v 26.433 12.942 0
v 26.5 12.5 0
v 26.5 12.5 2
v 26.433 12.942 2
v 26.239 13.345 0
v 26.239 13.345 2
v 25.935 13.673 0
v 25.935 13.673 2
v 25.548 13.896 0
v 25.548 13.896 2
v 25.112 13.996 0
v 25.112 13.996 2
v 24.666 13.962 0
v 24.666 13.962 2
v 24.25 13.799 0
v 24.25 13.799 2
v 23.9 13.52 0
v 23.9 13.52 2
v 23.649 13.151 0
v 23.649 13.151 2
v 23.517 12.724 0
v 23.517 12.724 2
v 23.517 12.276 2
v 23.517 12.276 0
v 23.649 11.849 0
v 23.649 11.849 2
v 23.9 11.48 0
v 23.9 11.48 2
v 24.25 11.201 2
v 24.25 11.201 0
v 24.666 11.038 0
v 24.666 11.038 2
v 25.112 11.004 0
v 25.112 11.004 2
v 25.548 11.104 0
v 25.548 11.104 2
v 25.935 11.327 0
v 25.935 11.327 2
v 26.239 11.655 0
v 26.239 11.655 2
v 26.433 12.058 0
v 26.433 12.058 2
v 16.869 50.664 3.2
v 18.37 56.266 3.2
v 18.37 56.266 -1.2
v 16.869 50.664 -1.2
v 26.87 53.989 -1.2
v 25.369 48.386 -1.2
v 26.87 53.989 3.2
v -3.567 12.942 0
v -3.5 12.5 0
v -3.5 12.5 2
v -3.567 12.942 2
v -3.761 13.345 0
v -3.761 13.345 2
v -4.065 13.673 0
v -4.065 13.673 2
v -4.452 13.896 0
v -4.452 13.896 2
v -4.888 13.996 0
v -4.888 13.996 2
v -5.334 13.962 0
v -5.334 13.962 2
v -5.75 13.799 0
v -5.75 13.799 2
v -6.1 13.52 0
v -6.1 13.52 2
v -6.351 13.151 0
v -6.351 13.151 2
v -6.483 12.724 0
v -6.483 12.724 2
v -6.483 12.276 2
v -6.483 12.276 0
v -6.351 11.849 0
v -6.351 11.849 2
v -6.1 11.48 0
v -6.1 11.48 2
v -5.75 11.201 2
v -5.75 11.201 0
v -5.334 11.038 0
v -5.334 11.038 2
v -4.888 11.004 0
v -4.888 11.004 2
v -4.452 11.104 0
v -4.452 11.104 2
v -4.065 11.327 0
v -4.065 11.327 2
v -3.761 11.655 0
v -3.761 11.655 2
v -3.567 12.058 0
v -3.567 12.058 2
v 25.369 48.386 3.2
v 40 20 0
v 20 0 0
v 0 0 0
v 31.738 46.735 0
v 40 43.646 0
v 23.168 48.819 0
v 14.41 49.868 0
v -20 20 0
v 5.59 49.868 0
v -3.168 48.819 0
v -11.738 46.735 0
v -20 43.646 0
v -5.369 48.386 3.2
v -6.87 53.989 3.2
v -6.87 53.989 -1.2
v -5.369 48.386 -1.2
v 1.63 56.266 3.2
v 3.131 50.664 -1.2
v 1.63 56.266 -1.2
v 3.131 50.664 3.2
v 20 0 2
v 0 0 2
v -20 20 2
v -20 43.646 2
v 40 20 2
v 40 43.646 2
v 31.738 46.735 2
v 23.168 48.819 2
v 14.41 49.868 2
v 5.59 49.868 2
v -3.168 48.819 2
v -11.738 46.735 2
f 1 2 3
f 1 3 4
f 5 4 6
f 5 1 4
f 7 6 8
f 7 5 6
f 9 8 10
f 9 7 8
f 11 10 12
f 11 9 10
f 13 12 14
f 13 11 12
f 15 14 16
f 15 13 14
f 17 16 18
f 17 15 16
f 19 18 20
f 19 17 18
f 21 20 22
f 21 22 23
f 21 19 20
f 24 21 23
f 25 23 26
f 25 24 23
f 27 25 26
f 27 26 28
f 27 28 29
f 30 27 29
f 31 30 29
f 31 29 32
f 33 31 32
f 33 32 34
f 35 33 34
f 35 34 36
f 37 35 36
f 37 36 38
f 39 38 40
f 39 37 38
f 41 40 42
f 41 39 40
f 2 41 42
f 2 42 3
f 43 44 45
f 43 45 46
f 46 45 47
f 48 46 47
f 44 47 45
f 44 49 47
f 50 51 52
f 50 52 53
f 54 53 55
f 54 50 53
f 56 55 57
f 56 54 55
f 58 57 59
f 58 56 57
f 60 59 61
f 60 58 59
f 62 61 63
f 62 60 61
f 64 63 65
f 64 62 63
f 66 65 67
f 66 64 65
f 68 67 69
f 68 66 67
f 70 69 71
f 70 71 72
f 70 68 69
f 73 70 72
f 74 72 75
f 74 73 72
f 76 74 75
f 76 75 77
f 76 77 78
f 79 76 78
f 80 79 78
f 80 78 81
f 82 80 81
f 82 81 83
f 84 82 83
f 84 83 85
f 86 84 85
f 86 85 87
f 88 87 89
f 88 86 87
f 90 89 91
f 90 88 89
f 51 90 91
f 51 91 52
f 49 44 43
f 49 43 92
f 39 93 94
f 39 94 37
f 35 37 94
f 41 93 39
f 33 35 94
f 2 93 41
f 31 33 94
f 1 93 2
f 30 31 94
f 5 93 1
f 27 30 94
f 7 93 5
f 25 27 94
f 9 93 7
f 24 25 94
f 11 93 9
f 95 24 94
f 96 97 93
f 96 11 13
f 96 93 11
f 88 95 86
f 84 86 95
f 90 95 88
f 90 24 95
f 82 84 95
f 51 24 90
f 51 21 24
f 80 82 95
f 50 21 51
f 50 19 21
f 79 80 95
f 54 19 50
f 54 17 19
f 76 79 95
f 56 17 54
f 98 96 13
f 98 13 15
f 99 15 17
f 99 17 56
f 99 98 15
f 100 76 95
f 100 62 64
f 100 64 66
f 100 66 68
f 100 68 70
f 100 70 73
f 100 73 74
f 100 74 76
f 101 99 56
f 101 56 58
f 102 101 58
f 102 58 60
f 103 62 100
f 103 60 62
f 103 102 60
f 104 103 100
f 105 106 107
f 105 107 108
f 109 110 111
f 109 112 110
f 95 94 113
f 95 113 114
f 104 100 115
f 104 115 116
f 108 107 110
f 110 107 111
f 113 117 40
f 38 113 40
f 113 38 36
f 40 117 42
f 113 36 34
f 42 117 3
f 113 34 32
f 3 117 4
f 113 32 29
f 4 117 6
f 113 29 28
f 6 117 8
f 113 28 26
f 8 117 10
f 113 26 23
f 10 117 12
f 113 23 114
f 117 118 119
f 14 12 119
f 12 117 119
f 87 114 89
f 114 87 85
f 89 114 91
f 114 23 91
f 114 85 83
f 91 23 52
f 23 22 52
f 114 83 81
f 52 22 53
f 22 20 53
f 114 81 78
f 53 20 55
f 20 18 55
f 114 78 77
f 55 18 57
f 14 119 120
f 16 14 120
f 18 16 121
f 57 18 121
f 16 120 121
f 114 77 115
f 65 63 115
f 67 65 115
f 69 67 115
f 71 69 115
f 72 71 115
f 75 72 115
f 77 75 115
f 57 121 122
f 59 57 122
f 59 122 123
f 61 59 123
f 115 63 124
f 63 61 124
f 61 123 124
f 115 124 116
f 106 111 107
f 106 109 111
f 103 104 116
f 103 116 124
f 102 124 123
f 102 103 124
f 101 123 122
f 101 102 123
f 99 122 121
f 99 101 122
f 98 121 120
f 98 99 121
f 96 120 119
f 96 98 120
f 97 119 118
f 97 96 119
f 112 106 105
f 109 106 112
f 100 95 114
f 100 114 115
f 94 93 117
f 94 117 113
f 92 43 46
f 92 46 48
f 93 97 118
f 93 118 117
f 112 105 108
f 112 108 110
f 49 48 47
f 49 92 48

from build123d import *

# Parameters (mm, degrees)
BOSS_EXTRU_1_DEPTH        = 3.2
BOSS_EXTRU_1_DEPTH_BACK   = 1.2
BOSS_EXTRU_1_2_DEPTH      = 3.2
BOSS_EXTRU_1_2_DEPTH_BACK = 1.2
ESQUISSE3_3_R             = 1.5
BOSS_EXTRU_2_DEPTH        = 2


with BuildPart() as part:
    # Esquisse3 → Boss.-Extru.1 (new, two sides: drawn at the far end of the back side and taken through both)
    with BuildSketch(Plane.XY.offset(-BOSS_EXTRU_1_DEPTH_BACK)):
        Polygon((-6.870147271, 53.988790736), (-5.36899681, 48.386420944), (3.131150462, 50.664028541), (1.63, 56.266398333), align=None)
    extrude(amount=BOSS_EXTRU_1_DEPTH + BOSS_EXTRU_1_DEPTH_BACK)


with BuildPart() as body_2:
    # Esquisse3 → Boss.-Extru.1 2 (new, two sides: drawn at the far end of the back side and taken through both)
    with BuildSketch(Plane.XY.offset(-BOSS_EXTRU_1_2_DEPTH_BACK)):
        Polygon((16.868849538, 50.664028541), (25.36899681, 48.386420944), (26.870147271, 53.988790736), (18.37, 56.266398333), align=None)
    extrude(amount=BOSS_EXTRU_1_2_DEPTH + BOSS_EXTRU_1_2_DEPTH_BACK)


with BuildPart() as body_3:
    # Esquisse3<3> → Boss.-Extru.2 (new body)
    with BuildSketch(Plane.XY):
        with BuildLine():
            Line((-20, 43.646138101), (-20, 20))
            Line((-20, 20), (0, 0))
            Line((0, 0), (20, 0))
            Line((20, 0), (40, 20))
            Line((40, 20), (40, 43.646138101))
            ThreePointArc((40, 43.646138101), (32.807981898, 46.397414454), (25.36899681, 48.386420944))
            ThreePointArc((25.36899681, 48.386420944), (10, 50), (-5.36899681, 48.386420944))
            ThreePointArc((-5.36899681, 48.386420944), (-12.807981898, 46.397414454), (-20, 43.646138101))
        make_face()
        with Locations((-5, 12.5)):
            Circle(ESQUISSE3_3_R, mode=Mode.SUBTRACT)
        with Locations((25, 12.5)):
            Circle(ESQUISSE3_3_R, mode=Mode.SUBTRACT)
    extrude(amount=BOSS_EXTRU_2_DEPTH)


solid = Compound([part.part, body_2.part, body_3.part])
